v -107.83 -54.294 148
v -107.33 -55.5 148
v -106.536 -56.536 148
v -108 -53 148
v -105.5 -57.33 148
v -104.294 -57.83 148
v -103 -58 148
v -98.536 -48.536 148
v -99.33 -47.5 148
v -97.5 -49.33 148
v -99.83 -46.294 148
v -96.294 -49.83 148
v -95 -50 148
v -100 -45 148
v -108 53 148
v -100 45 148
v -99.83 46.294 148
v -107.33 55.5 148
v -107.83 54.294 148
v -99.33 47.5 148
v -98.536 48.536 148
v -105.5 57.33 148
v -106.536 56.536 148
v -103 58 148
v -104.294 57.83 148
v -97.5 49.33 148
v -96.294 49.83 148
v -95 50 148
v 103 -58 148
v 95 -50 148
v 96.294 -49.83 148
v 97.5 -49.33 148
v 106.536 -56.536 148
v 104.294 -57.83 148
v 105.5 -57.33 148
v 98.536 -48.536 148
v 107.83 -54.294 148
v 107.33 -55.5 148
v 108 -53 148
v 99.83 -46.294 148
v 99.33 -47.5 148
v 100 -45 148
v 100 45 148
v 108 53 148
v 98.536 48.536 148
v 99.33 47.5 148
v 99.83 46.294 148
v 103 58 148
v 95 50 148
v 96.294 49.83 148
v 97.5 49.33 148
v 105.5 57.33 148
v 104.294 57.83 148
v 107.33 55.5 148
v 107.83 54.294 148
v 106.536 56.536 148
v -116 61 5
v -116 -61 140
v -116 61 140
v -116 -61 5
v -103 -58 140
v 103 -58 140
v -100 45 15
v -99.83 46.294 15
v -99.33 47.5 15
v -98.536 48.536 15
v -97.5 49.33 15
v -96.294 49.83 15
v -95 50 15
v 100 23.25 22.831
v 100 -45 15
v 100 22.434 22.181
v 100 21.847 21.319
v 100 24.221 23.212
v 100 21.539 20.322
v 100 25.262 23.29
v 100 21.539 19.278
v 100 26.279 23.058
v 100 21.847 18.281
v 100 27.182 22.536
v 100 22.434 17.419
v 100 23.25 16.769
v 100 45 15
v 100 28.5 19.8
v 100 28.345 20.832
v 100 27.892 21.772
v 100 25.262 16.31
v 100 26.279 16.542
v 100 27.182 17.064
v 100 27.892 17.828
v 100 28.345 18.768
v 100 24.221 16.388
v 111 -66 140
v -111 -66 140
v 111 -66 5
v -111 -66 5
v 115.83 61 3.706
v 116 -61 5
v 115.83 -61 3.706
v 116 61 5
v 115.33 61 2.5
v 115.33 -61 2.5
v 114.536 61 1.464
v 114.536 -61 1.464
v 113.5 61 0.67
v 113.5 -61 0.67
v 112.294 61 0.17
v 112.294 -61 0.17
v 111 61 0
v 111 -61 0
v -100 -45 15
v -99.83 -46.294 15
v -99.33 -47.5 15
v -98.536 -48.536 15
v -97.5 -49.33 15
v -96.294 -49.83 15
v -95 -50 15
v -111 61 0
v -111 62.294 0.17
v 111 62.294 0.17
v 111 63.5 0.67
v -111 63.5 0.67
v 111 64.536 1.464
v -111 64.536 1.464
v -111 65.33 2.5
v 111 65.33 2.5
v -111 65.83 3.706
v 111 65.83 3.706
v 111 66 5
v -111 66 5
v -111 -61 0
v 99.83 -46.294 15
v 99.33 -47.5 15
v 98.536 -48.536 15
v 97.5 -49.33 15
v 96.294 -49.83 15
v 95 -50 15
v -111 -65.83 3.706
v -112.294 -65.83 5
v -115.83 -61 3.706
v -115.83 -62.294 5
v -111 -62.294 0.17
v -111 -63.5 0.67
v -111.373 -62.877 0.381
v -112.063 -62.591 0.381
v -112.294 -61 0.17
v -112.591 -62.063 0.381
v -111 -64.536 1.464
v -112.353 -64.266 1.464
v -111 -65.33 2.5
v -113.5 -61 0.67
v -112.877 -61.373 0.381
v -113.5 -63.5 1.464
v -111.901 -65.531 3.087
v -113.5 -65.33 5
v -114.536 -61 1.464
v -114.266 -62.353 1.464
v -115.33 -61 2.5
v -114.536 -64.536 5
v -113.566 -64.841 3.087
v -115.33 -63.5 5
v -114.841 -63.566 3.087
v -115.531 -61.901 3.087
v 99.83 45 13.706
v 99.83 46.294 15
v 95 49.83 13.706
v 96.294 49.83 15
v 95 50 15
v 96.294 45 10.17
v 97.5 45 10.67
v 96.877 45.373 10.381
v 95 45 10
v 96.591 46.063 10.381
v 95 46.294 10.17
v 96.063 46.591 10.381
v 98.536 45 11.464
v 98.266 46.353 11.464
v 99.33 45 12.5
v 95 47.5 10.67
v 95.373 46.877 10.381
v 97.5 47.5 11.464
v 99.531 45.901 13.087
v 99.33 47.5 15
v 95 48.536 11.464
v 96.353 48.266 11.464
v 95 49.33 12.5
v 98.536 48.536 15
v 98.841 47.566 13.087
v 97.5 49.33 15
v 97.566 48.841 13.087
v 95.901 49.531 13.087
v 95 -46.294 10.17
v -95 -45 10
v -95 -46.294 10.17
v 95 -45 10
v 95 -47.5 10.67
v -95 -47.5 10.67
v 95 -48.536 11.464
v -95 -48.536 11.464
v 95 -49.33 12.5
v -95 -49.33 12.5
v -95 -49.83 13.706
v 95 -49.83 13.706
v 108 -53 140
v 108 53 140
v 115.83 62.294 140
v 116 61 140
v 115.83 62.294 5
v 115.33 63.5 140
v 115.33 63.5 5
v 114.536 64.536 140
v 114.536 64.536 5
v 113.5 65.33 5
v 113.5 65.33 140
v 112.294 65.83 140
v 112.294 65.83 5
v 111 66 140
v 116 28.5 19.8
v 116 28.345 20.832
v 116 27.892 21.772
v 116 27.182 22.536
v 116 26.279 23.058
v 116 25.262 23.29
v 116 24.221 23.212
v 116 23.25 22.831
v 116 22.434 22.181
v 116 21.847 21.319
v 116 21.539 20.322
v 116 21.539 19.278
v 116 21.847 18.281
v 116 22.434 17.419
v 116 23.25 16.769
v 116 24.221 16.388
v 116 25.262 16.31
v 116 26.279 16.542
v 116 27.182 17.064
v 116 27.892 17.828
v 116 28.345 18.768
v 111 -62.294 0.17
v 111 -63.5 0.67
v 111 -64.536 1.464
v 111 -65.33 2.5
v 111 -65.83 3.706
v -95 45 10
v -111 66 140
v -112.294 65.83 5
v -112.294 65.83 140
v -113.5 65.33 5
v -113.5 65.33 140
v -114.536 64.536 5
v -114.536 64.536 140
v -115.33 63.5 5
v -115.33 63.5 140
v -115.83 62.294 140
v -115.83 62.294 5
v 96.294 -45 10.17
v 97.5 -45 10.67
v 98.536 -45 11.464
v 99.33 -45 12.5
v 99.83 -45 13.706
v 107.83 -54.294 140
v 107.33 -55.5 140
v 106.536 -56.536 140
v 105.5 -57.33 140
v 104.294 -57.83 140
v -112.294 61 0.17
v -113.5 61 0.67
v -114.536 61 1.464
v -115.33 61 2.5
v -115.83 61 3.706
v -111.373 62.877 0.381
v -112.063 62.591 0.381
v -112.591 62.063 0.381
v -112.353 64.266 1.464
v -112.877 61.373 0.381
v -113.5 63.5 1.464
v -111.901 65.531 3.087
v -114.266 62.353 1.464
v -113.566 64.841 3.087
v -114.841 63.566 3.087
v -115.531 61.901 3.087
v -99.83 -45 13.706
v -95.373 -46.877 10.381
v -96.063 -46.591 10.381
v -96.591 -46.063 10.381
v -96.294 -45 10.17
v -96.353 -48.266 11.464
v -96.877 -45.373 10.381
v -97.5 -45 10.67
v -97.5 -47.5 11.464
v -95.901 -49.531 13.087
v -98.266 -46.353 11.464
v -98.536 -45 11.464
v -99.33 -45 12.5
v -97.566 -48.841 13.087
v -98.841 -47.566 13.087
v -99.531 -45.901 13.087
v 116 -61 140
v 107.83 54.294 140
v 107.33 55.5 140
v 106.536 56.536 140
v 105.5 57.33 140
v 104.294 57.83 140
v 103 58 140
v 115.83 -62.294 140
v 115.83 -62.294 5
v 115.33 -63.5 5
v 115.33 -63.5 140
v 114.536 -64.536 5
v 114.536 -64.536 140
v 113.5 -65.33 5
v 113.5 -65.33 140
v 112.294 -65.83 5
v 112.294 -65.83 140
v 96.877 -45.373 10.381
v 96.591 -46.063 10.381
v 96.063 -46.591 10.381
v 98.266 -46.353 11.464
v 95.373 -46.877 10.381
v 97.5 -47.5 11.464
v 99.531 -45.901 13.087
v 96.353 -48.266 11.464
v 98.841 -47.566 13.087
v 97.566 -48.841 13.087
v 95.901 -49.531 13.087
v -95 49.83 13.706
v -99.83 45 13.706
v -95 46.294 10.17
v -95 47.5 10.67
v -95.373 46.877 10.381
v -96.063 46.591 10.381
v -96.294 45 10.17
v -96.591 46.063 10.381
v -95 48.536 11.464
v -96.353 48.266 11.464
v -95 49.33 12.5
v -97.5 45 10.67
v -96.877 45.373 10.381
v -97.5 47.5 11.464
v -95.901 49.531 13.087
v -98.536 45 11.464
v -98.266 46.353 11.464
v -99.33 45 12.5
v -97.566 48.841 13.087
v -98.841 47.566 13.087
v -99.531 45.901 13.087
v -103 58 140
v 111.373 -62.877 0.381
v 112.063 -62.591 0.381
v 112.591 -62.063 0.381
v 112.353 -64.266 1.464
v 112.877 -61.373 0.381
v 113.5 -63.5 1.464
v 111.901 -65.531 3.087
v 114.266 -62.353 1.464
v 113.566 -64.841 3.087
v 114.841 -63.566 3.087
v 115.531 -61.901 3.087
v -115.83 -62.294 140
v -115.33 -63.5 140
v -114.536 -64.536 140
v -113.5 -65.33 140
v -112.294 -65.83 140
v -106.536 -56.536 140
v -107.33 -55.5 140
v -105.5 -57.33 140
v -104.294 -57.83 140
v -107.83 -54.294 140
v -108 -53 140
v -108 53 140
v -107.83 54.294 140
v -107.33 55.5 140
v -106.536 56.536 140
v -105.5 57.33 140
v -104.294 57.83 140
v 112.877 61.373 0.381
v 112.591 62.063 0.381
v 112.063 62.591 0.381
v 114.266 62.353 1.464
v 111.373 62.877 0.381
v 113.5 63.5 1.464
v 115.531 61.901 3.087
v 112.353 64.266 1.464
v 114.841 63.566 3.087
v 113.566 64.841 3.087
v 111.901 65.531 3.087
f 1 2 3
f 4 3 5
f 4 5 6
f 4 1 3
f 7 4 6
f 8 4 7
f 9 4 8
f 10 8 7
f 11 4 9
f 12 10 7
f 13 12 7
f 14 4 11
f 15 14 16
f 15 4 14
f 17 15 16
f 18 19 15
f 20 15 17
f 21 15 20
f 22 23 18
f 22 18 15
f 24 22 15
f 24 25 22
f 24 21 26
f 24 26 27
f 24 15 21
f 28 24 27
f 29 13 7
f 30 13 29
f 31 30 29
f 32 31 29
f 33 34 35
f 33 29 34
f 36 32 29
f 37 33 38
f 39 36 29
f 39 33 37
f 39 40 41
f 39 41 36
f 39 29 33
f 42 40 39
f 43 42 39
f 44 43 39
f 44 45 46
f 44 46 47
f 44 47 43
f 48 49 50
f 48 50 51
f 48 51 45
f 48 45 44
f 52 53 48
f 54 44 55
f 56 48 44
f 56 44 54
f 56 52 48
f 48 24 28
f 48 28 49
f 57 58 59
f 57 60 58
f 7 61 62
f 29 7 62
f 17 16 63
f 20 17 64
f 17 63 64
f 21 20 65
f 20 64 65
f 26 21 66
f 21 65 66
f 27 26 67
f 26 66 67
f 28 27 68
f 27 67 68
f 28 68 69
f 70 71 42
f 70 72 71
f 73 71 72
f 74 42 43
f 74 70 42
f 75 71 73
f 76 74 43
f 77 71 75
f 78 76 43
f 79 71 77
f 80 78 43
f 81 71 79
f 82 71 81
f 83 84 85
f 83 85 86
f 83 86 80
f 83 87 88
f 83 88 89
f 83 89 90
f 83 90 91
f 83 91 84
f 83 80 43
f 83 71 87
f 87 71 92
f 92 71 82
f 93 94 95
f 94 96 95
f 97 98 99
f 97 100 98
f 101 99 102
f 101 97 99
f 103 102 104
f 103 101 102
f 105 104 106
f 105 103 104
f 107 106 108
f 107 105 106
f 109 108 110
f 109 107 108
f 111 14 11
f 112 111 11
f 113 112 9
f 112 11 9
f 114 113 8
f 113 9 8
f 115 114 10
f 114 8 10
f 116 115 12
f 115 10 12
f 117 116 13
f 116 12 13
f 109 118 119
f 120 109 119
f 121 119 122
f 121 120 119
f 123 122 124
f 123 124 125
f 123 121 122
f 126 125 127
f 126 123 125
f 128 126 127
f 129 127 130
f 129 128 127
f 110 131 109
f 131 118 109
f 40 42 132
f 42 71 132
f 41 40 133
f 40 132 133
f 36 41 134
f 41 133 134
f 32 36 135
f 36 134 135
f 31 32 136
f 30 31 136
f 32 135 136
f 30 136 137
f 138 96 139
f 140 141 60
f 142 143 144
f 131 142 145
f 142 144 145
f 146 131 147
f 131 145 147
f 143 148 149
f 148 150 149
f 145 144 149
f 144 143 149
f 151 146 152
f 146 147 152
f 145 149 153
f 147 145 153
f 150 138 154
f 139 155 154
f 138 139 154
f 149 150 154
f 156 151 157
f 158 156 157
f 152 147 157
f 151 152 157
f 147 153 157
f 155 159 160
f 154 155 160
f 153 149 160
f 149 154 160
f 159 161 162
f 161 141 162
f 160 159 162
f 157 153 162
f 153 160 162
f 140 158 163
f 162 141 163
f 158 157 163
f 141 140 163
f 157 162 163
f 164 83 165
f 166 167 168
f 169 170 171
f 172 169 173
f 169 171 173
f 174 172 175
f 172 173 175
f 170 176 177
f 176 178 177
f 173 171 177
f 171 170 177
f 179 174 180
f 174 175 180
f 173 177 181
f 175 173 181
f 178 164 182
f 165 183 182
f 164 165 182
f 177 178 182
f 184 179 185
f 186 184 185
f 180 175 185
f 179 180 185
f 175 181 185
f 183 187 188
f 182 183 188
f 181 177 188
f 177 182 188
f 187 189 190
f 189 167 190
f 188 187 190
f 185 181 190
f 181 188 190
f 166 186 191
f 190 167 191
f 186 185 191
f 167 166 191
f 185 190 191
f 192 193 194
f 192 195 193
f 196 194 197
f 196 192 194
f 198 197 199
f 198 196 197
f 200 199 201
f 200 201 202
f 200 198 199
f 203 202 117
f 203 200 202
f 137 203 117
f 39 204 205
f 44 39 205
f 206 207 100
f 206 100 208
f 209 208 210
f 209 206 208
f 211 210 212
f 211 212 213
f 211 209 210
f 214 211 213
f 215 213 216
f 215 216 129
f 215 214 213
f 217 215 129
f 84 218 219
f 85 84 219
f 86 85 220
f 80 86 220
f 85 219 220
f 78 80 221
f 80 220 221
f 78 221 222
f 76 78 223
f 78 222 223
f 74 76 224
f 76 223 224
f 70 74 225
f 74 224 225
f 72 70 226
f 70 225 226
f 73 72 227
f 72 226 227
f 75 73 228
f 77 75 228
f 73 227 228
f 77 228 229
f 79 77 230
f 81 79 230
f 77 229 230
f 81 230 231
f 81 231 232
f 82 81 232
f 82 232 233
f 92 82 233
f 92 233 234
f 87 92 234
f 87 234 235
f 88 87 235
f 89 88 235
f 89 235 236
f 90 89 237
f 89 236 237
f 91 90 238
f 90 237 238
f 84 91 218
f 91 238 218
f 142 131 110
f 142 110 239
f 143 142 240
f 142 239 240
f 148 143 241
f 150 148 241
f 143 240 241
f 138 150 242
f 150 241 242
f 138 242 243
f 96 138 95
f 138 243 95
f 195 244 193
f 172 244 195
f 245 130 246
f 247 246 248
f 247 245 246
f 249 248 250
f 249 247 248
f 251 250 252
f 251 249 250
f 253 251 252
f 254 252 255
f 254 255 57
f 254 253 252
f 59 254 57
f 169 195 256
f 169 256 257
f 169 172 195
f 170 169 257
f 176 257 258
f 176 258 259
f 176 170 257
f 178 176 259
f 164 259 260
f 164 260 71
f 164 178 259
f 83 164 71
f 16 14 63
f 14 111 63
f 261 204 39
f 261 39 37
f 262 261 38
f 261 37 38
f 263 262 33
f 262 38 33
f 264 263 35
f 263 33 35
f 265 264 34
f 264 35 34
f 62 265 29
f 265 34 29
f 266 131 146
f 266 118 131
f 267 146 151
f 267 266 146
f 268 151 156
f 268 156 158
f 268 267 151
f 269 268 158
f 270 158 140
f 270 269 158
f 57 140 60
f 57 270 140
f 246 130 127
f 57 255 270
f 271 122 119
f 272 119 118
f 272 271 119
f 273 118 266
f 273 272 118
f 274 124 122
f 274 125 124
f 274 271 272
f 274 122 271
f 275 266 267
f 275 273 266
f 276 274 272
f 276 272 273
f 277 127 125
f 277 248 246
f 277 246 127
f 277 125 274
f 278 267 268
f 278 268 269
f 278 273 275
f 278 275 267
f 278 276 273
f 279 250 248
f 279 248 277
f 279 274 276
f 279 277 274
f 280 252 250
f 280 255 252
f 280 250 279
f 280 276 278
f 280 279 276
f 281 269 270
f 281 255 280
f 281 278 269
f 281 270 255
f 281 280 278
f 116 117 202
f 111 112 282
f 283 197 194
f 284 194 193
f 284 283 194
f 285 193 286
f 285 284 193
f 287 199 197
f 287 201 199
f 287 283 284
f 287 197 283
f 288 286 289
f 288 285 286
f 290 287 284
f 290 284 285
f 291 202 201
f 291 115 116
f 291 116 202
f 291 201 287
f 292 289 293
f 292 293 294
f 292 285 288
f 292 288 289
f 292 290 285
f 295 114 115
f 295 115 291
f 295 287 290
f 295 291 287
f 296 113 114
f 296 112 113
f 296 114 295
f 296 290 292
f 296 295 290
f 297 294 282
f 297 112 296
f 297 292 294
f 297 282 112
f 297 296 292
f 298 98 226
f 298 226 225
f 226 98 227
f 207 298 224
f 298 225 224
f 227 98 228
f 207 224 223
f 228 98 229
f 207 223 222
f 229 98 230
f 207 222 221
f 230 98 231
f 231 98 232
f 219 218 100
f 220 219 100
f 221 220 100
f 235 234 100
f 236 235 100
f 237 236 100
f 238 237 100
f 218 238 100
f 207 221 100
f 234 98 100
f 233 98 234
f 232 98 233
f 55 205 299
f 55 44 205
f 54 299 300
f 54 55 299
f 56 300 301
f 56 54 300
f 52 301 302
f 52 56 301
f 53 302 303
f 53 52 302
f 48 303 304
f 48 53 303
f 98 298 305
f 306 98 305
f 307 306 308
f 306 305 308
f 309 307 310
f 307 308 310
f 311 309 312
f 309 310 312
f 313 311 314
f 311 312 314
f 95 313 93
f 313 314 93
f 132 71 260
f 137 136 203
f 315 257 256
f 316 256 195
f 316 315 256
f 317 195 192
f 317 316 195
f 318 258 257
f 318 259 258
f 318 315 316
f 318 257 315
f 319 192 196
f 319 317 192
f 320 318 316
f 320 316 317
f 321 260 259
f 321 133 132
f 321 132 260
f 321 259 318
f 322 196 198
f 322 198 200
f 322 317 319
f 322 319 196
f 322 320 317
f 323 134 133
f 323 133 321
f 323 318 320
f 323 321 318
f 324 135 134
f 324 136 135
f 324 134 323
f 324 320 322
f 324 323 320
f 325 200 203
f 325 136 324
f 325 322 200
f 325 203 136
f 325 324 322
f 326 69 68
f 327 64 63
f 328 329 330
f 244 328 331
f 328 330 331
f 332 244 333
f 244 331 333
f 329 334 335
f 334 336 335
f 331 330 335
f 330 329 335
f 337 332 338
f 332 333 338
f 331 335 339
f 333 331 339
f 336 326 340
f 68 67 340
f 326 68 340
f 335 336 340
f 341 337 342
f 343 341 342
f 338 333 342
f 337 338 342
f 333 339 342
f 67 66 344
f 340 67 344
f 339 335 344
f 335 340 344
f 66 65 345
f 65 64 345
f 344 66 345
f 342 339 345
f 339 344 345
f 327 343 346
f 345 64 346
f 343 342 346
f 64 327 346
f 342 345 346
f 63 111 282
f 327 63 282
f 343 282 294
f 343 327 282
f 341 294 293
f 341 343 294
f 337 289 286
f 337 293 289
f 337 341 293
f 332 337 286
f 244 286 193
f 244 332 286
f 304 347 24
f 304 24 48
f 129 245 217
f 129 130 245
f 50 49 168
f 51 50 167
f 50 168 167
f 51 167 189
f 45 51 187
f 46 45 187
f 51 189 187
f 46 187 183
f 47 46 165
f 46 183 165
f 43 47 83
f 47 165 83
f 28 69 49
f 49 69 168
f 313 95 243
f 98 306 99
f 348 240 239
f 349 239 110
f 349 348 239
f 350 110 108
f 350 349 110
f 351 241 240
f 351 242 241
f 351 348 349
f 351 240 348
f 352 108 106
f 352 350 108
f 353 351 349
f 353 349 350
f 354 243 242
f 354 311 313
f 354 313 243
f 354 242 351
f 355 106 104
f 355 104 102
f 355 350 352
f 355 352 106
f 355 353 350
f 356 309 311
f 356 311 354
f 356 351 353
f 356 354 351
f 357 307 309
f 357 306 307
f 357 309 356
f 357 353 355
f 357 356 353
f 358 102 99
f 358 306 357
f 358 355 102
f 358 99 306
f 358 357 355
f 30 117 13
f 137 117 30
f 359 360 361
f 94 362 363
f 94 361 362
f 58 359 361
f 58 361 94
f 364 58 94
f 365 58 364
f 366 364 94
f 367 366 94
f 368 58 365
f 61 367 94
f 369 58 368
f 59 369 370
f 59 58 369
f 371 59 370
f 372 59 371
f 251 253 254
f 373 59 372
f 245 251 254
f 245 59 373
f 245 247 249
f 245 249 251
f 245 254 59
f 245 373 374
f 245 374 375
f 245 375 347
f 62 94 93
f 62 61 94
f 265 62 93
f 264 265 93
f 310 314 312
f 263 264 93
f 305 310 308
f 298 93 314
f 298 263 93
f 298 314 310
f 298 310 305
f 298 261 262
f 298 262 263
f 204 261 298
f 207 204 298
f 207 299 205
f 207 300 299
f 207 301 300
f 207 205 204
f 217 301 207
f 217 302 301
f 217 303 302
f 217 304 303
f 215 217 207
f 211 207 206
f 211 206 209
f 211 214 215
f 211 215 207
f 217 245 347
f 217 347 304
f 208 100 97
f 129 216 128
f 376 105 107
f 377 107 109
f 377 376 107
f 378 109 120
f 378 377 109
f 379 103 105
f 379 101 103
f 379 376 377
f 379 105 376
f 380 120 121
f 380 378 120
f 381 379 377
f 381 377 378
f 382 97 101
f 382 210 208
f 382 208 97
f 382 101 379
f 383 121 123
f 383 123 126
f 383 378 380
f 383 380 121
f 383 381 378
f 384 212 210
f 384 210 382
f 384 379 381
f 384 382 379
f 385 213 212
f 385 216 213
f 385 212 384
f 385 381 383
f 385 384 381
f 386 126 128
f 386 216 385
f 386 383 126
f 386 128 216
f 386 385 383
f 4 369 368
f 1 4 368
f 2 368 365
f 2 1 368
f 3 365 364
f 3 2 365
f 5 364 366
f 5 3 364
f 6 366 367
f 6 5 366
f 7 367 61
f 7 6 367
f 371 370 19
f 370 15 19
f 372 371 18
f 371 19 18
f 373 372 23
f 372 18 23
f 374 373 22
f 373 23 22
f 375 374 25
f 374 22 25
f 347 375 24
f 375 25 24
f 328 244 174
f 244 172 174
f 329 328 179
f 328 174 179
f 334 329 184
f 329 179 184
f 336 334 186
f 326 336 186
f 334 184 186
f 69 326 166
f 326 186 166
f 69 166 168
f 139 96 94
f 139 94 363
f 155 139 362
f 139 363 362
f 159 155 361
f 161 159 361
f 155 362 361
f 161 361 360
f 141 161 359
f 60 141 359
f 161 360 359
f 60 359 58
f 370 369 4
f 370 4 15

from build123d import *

# Parameters (mm, degrees)
SKETCH_W        = 232
SKETCH_H        = 132
PAD_DEPTH       = 140
SKETCH001_W     = 200
SKETCH001_H     = 100
POCKET_DEPTH    = 130
SKETCH002_W     = 216
SKETCH002_H     = 116
SKETCH002_W_2   = 200
SKETCH002_H_2   = 100
PAD001_DEPTH    = 8
FILLET_R        = 5
SKETCH008_R     = 3.5
POCKET003_DEPTH = 16


with BuildPart() as part:
    # Sketch → Pad (new body)
    with BuildSketch(Plane.XY):
        Rectangle(SKETCH_W, SKETCH_H)
    extrude(amount=PAD_DEPTH)

    # Sketch001 (on Face6 of Pad) → Pocket (cut)
    with BuildSketch(Plane.XY.offset(140)):
        Rectangle(SKETCH001_W, SKETCH001_H)
    extrude(amount=-POCKET_DEPTH, mode=Mode.SUBTRACT)

    # Sketch002 (on Face5 of Pocket) → Pad001 (join)
    with BuildSketch(Plane.XY.offset(140)):
        Rectangle(SKETCH002_W, SKETCH002_H)
        Rectangle(SKETCH002_W_2, SKETCH002_H_2, mode=Mode.SUBTRACT)
    extrude(amount=PAD001_DEPTH)

    # Fillet
    fillet_edges = [part.edges().sort_by_distance(p)[0] for p in [
        (-116, -66, 70),
        (116, -66, 70),
        (116, 66, 70),
        (0, -66, 0),
        (116, 0, 0),
        (-100, 50, 79),
        (-100, -50, 79),
        (-116, 66, 70),
        (100, -50, 79),
        (100, 50, 79),
        (100, 0, 10),
        (0, -50, 10),
        (0, 50, 10),
        (-100, 0, 10),
        (108, -58, 144),
        (108, 58, 144),
        (-108, -58, 144),
        (-108, 58, 144),
        (0, 66, 0),
        (-116, 0, 0),
    ]]
    fillet(fillet_edges, radius=FILLET_R)

    # Sketch008 (on Face10 of Fillet) → Pocket003 (cut)
    with BuildSketch(Plane.YZ.offset(116)):
        with Locations((25, 19.8)):
            Circle(SKETCH008_R)
    extrude(amount=-POCKET003_DEPTH, mode=Mode.SUBTRACT)


solid = part.part
